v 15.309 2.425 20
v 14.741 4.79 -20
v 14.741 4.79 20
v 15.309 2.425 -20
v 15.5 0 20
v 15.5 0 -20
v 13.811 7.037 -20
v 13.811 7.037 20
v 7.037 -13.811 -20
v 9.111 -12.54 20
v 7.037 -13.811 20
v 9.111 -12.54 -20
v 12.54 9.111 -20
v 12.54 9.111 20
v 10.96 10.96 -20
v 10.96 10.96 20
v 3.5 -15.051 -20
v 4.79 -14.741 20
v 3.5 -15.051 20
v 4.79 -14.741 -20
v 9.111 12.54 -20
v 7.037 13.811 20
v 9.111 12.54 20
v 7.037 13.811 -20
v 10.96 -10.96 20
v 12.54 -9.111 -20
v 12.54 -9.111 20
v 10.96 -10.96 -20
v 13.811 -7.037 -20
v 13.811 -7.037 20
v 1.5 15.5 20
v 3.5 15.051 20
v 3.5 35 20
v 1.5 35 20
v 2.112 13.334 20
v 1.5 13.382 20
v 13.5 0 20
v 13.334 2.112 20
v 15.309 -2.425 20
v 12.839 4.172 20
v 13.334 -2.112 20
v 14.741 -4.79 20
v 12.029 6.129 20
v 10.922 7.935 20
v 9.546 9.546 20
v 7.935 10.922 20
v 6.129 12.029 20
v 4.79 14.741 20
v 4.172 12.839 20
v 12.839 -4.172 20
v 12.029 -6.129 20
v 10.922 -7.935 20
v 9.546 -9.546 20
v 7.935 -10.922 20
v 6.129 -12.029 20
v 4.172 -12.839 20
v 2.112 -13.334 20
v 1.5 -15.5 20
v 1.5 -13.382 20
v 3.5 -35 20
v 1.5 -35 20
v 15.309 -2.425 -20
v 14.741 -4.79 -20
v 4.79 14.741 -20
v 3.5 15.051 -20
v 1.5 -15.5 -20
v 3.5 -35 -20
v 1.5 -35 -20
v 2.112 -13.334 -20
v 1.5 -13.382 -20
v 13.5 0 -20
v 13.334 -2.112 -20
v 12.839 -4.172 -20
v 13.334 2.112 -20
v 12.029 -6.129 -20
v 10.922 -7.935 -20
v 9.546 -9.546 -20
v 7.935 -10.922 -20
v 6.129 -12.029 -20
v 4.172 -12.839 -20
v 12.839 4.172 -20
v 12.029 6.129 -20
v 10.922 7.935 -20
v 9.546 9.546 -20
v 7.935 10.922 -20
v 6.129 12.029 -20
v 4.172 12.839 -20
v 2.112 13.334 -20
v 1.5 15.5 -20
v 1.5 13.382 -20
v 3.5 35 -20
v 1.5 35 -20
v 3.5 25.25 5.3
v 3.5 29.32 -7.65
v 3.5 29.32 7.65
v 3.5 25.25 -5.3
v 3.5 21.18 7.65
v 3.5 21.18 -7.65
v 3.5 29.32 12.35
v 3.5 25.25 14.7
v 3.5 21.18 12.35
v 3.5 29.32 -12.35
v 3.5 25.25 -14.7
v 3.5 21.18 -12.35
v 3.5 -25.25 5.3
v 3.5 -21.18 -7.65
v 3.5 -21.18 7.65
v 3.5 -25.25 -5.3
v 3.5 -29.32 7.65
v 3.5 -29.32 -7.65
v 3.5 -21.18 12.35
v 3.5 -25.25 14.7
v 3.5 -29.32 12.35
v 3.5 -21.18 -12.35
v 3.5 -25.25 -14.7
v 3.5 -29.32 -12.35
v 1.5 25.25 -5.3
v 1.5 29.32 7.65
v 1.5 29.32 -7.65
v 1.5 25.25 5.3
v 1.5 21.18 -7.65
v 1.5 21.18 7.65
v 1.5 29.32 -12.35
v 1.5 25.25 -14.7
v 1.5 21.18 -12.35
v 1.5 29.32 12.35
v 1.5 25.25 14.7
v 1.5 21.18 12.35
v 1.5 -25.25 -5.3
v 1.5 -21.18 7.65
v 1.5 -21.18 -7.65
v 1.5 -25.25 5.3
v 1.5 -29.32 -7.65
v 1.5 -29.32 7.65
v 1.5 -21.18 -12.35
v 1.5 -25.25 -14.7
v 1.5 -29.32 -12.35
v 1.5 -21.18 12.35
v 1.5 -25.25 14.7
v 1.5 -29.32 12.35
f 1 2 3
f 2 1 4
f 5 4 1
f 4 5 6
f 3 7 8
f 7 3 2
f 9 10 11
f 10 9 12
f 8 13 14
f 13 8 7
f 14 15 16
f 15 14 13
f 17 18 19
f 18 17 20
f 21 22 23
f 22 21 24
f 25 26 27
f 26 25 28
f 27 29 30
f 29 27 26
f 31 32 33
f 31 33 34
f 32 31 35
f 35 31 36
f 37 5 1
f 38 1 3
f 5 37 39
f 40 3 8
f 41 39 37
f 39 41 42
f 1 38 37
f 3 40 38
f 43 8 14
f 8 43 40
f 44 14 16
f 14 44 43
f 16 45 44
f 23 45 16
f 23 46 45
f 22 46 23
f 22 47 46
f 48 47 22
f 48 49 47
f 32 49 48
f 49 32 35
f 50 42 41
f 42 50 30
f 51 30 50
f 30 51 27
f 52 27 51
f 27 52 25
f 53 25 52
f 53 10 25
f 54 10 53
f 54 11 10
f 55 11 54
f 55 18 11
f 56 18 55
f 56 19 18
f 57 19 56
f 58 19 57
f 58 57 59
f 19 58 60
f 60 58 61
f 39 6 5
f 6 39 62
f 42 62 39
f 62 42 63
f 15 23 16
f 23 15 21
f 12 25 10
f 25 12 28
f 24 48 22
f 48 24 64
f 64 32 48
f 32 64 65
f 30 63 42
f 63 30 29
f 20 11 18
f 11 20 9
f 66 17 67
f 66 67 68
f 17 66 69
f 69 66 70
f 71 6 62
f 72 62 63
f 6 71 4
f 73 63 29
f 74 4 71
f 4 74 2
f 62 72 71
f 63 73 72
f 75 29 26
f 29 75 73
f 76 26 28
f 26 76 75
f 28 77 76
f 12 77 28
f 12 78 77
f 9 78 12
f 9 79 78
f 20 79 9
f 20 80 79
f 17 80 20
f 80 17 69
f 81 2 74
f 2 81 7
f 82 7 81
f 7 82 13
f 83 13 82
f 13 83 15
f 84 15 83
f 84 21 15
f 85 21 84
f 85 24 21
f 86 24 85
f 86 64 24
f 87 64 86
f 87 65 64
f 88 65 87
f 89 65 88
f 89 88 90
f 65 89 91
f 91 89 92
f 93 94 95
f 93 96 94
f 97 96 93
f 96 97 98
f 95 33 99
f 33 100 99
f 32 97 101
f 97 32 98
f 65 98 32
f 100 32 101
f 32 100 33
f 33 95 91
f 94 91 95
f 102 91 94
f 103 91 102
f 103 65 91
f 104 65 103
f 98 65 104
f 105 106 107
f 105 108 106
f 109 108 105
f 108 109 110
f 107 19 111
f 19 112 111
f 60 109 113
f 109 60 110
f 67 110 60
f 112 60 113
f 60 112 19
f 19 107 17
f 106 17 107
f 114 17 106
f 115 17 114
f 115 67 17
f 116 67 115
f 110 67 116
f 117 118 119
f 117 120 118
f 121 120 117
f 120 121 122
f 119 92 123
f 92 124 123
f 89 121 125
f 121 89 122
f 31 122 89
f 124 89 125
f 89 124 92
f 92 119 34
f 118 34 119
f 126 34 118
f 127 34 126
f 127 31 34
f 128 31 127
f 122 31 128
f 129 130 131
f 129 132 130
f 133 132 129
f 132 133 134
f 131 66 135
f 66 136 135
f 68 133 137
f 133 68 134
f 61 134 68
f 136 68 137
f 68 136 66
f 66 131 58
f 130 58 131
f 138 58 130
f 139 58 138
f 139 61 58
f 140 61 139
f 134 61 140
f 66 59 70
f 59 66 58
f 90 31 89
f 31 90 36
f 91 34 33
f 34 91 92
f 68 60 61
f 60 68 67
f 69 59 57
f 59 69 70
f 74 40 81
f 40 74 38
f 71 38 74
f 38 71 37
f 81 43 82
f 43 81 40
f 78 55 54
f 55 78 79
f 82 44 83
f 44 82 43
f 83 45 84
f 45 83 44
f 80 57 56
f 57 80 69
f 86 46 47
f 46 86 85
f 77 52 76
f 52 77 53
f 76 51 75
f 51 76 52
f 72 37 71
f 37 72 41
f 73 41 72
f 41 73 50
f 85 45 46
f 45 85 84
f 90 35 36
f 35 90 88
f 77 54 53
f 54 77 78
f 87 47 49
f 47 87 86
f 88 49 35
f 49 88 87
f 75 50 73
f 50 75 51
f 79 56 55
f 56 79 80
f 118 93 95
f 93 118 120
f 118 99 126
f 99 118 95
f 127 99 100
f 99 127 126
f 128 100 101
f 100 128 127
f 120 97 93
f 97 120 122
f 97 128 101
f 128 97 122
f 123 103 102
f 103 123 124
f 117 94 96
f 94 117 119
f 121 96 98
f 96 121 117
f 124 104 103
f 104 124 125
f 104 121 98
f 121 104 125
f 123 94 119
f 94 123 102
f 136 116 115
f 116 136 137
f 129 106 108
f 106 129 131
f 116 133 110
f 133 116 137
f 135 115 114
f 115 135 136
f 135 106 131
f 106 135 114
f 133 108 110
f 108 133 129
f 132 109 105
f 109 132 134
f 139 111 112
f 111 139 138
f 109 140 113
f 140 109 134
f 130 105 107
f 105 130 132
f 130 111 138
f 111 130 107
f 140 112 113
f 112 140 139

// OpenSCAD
// file: ../configuration.scad
$fn=40; // model faces resolution.

//OBECNE PARAMETRY 
//----------------------------------------------------------------
//----------------------------------------------------------------
//WINDGAUGE02A_S02 - Parametry pro hlavni valec anemometru
S01_hloubka_zavitu=4;
S01_vyska=80; //80
S01_prumer_vnitrni=46;
S01_sila_materialu=1.2;
S01_vyska_horni_zavit=10;
S01_vyska_spodniho_zavitu=10;
S01_sila_drzaku_RJ11=3; //vyška drážky
S01_hrana_A_RJ11=12.3;
S01_hrana_B_RJ11=19;
S01_tolerance_zavit=1.5;

//Rozměry ložiska se závity
LO_spodni_prumer=22;
LO_doraz_prumer=44.3;
LO_horni_prumer=7.7;
LO_vyska_spodni_doraz=5;
LO_vyska_horni_doraz=9;
LO_vyska_dorazu=0;



//Obecné parametry
prumer_osicky=5.1;

//Rozmery modulu se senzorem
senzor_delka=22;
senzor_sirka=20.4;
senzor_sila=2;


//Parametry loziska
lozisko_prumer_vnitrni=4.9;
lozisko_prumer_vnejsi=16.1;
lozisko_vyska=5;
lozisko_prekryv=1.5;

//Parametry magnetu
magnet_prumer=6.3;
magnet_vyska=5;
magnet_zapusteni=2;
magnet_tolerance_prumeru=0.2;

//Parametry sroubu
prumer_sroubu=3.4;
prumer_hlavy_sroubu=6;
vyska_hlavy_sroubu=4;
vyska_matky=3;
sirka_matky=6.7;

sirka_matky_tol=0.175;
prumer_orechu=10;

//WINDGAUGE02A_R01 //pro lopatku
L01_hrana_drzaku_a=10;
L01_hrana_drzaku_b=3;
L01_delka_uchytu=19;
L01_prumer_lopatky=40;
L01_sila_materialu_lopatky=0.9;

//WINDGAUGE02A_D01 //uchyt velky
D01_material_pod_zavitem=3;
D01_material_za_zavitem=3;
D01_material_pred_zavitem=2;
D01_delka_tyce=40;
D01_sirka_tyce=10;

//WINDGAUGE02A_D02 //uchyt na sloup
D02_sila_materialu=2;
D02_vyska_uchytky=40;
D02_prumer_obruby=27; // 3/4 trubka
D02_delka_celeho_uchytu=70;
D02_dotahova_vzdalenost=1.5;
D02_prumer_uchytneho_sroubu=4.2;
D02_sirka_matky=9.2; //pro M4
D02_vyska_matky=3;


//WINDGAUGE02A_R01 //rotor s prekritim statoru
R01_vyska_preryti_statoru=10;
R01_sila_materialu_pro_prekriti=1.3;
R01_mezera_mezi_statorem_rotorem=3;

//WINDGAUGE02A_R03 //drzak magnetu
R05_sirka_matky=10;



R03_prumer_zavitu=40;
R04_zavit_vyska=5;
R02_zavit_vyska=10;
R01_zavit_vyska=5;
R03_mezera_mezi_statorem_rotorem=3;

R02_delka_kridla=45;
R02_vyska_kridla=70;
R02_delka_vyrovnnavaci_tyce=35;
R02_hrana_drzaku=10;
R02_sila_materialu_pod_tyci=5;
R02_sila_materialu_kridla=1.2;
R02_sila_materialu_kridla_tolerance=0.2;
// main file
$fn=40; // model faces resolution.
include <../configuration.scad>

WINDGAUGE01A_D01();
//Drzak na sloup - cast bez drzaku anemometru
module WINDGAUGE01A_D01(){
	
difference()
    {
    union()
        {
        //základní válec
        cylinder(h=D02_vyska_uchytky,r=(D02_prumer_obruby+2*D02_sila_materialu)/2,center=true);
		//úchytové plošky		
        translate([D02_dotahova_vzdalenost+D02_sila_materialu/2,0,0]){cube([D02_sila_materialu,D02_delka_celeho_uchytu,D02_vyska_uchytky],center=true);}
		}
    
    //válec na odečet
    cylinder(h=D02_vyska_uchytky+0.01,r=D02_prumer_obruby/2,center=true);     
	        
    //kvádr na odecet
	translate([D02_dotahova_vzdalenost-(D02_prumer_obruby+2*D02_sila_materialu)/2,0,0]){cube([D02_prumer_obruby+2*D02_sila_materialu,D02_prumer_obruby+2*D02_sila_materialu,D02_vyska_uchytky+0.01],center=true);}
		
	//otvory na sroub
	translate([D02_dotahova_vzdalenost,(D02_delka_celeho_uchytu/2-D02_prumer_obruby/2-D02_sila_materialu)/2+D02_prumer_obruby/2+D02_sila_materialu,D02_vyska_uchytky/4]){rotate([0,90,0]){cylinder(h=D02_sila_materialu+0.01,r=D02_prumer_uchytneho_sroubu/2);}}
    
     //drzak matky
    translate([D02_dotahova_vzdalenost+D02_sila_materialu-D02_vyska_matky,(D02_delka_celeho_uchytu/2-D02_prumer_obruby/2-D02_sila_materialu)/2+D02_prumer_obruby/2+D02_sila_materialu,D02_vyska_uchytky/4]){rotate([0,90,0]){ cylinder (h = D02_vyska_matky+0.01, r= (D02_sirka_matky+0.2)/2, $fn=6);}}
   
     
        
    translate([D02_dotahova_vzdalenost,(D02_delka_celeho_uchytu/2-D02_prumer_obruby/2-D02_sila_materialu)/2+D02_prumer_obruby/2+D02_sila_materialu,-D02_vyska_uchytky/4]){rotate([0,90,0]){cylinder(h=D02_sila_materialu+0.01,r=D02_prumer_uchytneho_sroubu/2);}}
    
     //drzak matky
    translate([D02_dotahova_vzdalenost+D02_sila_materialu-D02_vyska_matky,(D02_delka_celeho_uchytu/2-D02_prumer_obruby/2-D02_sila_materialu)/2+D02_prumer_obruby/2+D02_sila_materialu,-D02_vyska_uchytky/4]){rotate([0,90,0]){ cylinder (h = D02_vyska_matky+0.01, r= (D02_sirka_matky+0.2)/2, $fn=6);}}
        
	translate([D02_dotahova_vzdalenost,-((D02_delka_celeho_uchytu/2-D02_prumer_obruby/2-D02_sila_materialu)/2+D02_prumer_obruby/2+D02_sila_materialu),-D02_vyska_uchytky/4]){rotate([0,90,0]){cylinder(h=D02_sila_materialu+0.01,r=D02_prumer_uchytneho_sroubu/2);}}
    
     //drzak matky
    translate([D02_dotahova_vzdalenost+D02_sila_materialu-D02_vyska_matky,-((D02_delka_celeho_uchytu/2-D02_prumer_obruby/2-D02_sila_materialu)/2+D02_prumer_obruby/2+D02_sila_materialu),-D02_vyska_uchytky/4]){rotate([0,90,0]){ cylinder (h = D02_vyska_matky+0.01, r= (D02_sirka_matky+0.2)/2, $fn=6);}}

    translate([D02_dotahova_vzdalenost,-((D02_delka_celeho_uchytu/2-D02_prumer_obruby/2-D02_sila_materialu)/2+D02_prumer_obruby/2+D02_sila_materialu),D02_vyska_uchytky/4]){rotate([0,90,0]){cylinder(h=D02_sila_materialu+0.01,r=D02_prumer_uchytneho_sroubu/2);}}	
    
     //drzak matky
    translate([D02_dotahova_vzdalenost+D02_sila_materialu-D02_vyska_matky,-((D02_delka_celeho_uchytu/2-D02_prumer_obruby/2-D02_sila_materialu)/2+D02_prumer_obruby/2+D02_sila_materialu),D02_vyska_uchytky/4]){rotate([0,90,0]){ cylinder (h = D02_vyska_matky+0.01, r= (D02_sirka_matky+0.2)/2, $fn=6);}}
	
    }
}

module WINDGAUGE01A_D01_2(){
	
difference()
    {
    union()
        {
        //základní válec
        cylinder(h=D02_vyska_uchytky,r=(D02_prumer_obruby+2*D02_sila_materialu)/2,center=true);
		//úchytové plošky		
        translate([D02_dotahova_vzdalenost+D02_sila_materialu/2,0,0]){cube([D02_sila_materialu,D02_delka_celeho_uchytu,D02_vyska_uchytky],center=true);}
		}
    
    //válec na odečet
    cylinder(h=D02_vyska_uchytky+0.01,r=D02_prumer_obruby/2,center=true);     
	        
    //kvádr na odecet
	translate([D02_dotahova_vzdalenost-(D02_prumer_obruby+2*D02_sila_materialu)/2,0,0]){cube([D02_prumer_obruby+2*D02_sila_materialu,D02_prumer_obruby+2*D02_sila_materialu,D02_vyska_uchytky+0.01],center=true);}
		
	//otvory na sroub
	translate([D02_dotahova_vzdalenost,(D02_delka_celeho_uchytu/2-D02_prumer_obruby/2-D02_sila_materialu)/2+D02_prumer_obruby/2+D02_sila_materialu,D02_vyska_uchytky/4]){rotate([0,90,0]){cylinder(h=D02_sila_materialu+0.01,r=D02_prumer_uchytneho_sroubu/2);}}
    
    
   
     
        
    translate([D02_dotahova_vzdalenost,(D02_delka_celeho_uchytu/2-D02_prumer_obruby/2-D02_sila_materialu)/2+D02_prumer_obruby/2+D02_sila_materialu,-D02_vyska_uchytky/4]){rotate([0,90,0]){cylinder(h=D02_sila_materialu+0.01,r=D02_prumer_uchytneho_sroubu/2);}}
    
     
        
	translate([D02_dotahova_vzdalenost,-((D02_delka_celeho_uchytu/2-D02_prumer_obruby/2-D02_sila_materialu)/2+D02_prumer_obruby/2+D02_sila_materialu),-D02_vyska_uchytky/4]){rotate([0,90,0]){cylinder(h=D02_sila_materialu+0.01,r=D02_prumer_uchytneho_sroubu/2);}}
    
    

    translate([D02_dotahova_vzdalenost,-((D02_delka_celeho_uchytu/2-D02_prumer_obruby/2-D02_sila_materialu)/2+D02_prumer_obruby/2+D02_sila_materialu),D02_vyska_uchytky/4]){rotate([0,90,0]){cylinder(h=D02_sila_materialu+0.01,r=D02_prumer_uchytneho_sroubu/2);}}	
    
    
	
    }
}
